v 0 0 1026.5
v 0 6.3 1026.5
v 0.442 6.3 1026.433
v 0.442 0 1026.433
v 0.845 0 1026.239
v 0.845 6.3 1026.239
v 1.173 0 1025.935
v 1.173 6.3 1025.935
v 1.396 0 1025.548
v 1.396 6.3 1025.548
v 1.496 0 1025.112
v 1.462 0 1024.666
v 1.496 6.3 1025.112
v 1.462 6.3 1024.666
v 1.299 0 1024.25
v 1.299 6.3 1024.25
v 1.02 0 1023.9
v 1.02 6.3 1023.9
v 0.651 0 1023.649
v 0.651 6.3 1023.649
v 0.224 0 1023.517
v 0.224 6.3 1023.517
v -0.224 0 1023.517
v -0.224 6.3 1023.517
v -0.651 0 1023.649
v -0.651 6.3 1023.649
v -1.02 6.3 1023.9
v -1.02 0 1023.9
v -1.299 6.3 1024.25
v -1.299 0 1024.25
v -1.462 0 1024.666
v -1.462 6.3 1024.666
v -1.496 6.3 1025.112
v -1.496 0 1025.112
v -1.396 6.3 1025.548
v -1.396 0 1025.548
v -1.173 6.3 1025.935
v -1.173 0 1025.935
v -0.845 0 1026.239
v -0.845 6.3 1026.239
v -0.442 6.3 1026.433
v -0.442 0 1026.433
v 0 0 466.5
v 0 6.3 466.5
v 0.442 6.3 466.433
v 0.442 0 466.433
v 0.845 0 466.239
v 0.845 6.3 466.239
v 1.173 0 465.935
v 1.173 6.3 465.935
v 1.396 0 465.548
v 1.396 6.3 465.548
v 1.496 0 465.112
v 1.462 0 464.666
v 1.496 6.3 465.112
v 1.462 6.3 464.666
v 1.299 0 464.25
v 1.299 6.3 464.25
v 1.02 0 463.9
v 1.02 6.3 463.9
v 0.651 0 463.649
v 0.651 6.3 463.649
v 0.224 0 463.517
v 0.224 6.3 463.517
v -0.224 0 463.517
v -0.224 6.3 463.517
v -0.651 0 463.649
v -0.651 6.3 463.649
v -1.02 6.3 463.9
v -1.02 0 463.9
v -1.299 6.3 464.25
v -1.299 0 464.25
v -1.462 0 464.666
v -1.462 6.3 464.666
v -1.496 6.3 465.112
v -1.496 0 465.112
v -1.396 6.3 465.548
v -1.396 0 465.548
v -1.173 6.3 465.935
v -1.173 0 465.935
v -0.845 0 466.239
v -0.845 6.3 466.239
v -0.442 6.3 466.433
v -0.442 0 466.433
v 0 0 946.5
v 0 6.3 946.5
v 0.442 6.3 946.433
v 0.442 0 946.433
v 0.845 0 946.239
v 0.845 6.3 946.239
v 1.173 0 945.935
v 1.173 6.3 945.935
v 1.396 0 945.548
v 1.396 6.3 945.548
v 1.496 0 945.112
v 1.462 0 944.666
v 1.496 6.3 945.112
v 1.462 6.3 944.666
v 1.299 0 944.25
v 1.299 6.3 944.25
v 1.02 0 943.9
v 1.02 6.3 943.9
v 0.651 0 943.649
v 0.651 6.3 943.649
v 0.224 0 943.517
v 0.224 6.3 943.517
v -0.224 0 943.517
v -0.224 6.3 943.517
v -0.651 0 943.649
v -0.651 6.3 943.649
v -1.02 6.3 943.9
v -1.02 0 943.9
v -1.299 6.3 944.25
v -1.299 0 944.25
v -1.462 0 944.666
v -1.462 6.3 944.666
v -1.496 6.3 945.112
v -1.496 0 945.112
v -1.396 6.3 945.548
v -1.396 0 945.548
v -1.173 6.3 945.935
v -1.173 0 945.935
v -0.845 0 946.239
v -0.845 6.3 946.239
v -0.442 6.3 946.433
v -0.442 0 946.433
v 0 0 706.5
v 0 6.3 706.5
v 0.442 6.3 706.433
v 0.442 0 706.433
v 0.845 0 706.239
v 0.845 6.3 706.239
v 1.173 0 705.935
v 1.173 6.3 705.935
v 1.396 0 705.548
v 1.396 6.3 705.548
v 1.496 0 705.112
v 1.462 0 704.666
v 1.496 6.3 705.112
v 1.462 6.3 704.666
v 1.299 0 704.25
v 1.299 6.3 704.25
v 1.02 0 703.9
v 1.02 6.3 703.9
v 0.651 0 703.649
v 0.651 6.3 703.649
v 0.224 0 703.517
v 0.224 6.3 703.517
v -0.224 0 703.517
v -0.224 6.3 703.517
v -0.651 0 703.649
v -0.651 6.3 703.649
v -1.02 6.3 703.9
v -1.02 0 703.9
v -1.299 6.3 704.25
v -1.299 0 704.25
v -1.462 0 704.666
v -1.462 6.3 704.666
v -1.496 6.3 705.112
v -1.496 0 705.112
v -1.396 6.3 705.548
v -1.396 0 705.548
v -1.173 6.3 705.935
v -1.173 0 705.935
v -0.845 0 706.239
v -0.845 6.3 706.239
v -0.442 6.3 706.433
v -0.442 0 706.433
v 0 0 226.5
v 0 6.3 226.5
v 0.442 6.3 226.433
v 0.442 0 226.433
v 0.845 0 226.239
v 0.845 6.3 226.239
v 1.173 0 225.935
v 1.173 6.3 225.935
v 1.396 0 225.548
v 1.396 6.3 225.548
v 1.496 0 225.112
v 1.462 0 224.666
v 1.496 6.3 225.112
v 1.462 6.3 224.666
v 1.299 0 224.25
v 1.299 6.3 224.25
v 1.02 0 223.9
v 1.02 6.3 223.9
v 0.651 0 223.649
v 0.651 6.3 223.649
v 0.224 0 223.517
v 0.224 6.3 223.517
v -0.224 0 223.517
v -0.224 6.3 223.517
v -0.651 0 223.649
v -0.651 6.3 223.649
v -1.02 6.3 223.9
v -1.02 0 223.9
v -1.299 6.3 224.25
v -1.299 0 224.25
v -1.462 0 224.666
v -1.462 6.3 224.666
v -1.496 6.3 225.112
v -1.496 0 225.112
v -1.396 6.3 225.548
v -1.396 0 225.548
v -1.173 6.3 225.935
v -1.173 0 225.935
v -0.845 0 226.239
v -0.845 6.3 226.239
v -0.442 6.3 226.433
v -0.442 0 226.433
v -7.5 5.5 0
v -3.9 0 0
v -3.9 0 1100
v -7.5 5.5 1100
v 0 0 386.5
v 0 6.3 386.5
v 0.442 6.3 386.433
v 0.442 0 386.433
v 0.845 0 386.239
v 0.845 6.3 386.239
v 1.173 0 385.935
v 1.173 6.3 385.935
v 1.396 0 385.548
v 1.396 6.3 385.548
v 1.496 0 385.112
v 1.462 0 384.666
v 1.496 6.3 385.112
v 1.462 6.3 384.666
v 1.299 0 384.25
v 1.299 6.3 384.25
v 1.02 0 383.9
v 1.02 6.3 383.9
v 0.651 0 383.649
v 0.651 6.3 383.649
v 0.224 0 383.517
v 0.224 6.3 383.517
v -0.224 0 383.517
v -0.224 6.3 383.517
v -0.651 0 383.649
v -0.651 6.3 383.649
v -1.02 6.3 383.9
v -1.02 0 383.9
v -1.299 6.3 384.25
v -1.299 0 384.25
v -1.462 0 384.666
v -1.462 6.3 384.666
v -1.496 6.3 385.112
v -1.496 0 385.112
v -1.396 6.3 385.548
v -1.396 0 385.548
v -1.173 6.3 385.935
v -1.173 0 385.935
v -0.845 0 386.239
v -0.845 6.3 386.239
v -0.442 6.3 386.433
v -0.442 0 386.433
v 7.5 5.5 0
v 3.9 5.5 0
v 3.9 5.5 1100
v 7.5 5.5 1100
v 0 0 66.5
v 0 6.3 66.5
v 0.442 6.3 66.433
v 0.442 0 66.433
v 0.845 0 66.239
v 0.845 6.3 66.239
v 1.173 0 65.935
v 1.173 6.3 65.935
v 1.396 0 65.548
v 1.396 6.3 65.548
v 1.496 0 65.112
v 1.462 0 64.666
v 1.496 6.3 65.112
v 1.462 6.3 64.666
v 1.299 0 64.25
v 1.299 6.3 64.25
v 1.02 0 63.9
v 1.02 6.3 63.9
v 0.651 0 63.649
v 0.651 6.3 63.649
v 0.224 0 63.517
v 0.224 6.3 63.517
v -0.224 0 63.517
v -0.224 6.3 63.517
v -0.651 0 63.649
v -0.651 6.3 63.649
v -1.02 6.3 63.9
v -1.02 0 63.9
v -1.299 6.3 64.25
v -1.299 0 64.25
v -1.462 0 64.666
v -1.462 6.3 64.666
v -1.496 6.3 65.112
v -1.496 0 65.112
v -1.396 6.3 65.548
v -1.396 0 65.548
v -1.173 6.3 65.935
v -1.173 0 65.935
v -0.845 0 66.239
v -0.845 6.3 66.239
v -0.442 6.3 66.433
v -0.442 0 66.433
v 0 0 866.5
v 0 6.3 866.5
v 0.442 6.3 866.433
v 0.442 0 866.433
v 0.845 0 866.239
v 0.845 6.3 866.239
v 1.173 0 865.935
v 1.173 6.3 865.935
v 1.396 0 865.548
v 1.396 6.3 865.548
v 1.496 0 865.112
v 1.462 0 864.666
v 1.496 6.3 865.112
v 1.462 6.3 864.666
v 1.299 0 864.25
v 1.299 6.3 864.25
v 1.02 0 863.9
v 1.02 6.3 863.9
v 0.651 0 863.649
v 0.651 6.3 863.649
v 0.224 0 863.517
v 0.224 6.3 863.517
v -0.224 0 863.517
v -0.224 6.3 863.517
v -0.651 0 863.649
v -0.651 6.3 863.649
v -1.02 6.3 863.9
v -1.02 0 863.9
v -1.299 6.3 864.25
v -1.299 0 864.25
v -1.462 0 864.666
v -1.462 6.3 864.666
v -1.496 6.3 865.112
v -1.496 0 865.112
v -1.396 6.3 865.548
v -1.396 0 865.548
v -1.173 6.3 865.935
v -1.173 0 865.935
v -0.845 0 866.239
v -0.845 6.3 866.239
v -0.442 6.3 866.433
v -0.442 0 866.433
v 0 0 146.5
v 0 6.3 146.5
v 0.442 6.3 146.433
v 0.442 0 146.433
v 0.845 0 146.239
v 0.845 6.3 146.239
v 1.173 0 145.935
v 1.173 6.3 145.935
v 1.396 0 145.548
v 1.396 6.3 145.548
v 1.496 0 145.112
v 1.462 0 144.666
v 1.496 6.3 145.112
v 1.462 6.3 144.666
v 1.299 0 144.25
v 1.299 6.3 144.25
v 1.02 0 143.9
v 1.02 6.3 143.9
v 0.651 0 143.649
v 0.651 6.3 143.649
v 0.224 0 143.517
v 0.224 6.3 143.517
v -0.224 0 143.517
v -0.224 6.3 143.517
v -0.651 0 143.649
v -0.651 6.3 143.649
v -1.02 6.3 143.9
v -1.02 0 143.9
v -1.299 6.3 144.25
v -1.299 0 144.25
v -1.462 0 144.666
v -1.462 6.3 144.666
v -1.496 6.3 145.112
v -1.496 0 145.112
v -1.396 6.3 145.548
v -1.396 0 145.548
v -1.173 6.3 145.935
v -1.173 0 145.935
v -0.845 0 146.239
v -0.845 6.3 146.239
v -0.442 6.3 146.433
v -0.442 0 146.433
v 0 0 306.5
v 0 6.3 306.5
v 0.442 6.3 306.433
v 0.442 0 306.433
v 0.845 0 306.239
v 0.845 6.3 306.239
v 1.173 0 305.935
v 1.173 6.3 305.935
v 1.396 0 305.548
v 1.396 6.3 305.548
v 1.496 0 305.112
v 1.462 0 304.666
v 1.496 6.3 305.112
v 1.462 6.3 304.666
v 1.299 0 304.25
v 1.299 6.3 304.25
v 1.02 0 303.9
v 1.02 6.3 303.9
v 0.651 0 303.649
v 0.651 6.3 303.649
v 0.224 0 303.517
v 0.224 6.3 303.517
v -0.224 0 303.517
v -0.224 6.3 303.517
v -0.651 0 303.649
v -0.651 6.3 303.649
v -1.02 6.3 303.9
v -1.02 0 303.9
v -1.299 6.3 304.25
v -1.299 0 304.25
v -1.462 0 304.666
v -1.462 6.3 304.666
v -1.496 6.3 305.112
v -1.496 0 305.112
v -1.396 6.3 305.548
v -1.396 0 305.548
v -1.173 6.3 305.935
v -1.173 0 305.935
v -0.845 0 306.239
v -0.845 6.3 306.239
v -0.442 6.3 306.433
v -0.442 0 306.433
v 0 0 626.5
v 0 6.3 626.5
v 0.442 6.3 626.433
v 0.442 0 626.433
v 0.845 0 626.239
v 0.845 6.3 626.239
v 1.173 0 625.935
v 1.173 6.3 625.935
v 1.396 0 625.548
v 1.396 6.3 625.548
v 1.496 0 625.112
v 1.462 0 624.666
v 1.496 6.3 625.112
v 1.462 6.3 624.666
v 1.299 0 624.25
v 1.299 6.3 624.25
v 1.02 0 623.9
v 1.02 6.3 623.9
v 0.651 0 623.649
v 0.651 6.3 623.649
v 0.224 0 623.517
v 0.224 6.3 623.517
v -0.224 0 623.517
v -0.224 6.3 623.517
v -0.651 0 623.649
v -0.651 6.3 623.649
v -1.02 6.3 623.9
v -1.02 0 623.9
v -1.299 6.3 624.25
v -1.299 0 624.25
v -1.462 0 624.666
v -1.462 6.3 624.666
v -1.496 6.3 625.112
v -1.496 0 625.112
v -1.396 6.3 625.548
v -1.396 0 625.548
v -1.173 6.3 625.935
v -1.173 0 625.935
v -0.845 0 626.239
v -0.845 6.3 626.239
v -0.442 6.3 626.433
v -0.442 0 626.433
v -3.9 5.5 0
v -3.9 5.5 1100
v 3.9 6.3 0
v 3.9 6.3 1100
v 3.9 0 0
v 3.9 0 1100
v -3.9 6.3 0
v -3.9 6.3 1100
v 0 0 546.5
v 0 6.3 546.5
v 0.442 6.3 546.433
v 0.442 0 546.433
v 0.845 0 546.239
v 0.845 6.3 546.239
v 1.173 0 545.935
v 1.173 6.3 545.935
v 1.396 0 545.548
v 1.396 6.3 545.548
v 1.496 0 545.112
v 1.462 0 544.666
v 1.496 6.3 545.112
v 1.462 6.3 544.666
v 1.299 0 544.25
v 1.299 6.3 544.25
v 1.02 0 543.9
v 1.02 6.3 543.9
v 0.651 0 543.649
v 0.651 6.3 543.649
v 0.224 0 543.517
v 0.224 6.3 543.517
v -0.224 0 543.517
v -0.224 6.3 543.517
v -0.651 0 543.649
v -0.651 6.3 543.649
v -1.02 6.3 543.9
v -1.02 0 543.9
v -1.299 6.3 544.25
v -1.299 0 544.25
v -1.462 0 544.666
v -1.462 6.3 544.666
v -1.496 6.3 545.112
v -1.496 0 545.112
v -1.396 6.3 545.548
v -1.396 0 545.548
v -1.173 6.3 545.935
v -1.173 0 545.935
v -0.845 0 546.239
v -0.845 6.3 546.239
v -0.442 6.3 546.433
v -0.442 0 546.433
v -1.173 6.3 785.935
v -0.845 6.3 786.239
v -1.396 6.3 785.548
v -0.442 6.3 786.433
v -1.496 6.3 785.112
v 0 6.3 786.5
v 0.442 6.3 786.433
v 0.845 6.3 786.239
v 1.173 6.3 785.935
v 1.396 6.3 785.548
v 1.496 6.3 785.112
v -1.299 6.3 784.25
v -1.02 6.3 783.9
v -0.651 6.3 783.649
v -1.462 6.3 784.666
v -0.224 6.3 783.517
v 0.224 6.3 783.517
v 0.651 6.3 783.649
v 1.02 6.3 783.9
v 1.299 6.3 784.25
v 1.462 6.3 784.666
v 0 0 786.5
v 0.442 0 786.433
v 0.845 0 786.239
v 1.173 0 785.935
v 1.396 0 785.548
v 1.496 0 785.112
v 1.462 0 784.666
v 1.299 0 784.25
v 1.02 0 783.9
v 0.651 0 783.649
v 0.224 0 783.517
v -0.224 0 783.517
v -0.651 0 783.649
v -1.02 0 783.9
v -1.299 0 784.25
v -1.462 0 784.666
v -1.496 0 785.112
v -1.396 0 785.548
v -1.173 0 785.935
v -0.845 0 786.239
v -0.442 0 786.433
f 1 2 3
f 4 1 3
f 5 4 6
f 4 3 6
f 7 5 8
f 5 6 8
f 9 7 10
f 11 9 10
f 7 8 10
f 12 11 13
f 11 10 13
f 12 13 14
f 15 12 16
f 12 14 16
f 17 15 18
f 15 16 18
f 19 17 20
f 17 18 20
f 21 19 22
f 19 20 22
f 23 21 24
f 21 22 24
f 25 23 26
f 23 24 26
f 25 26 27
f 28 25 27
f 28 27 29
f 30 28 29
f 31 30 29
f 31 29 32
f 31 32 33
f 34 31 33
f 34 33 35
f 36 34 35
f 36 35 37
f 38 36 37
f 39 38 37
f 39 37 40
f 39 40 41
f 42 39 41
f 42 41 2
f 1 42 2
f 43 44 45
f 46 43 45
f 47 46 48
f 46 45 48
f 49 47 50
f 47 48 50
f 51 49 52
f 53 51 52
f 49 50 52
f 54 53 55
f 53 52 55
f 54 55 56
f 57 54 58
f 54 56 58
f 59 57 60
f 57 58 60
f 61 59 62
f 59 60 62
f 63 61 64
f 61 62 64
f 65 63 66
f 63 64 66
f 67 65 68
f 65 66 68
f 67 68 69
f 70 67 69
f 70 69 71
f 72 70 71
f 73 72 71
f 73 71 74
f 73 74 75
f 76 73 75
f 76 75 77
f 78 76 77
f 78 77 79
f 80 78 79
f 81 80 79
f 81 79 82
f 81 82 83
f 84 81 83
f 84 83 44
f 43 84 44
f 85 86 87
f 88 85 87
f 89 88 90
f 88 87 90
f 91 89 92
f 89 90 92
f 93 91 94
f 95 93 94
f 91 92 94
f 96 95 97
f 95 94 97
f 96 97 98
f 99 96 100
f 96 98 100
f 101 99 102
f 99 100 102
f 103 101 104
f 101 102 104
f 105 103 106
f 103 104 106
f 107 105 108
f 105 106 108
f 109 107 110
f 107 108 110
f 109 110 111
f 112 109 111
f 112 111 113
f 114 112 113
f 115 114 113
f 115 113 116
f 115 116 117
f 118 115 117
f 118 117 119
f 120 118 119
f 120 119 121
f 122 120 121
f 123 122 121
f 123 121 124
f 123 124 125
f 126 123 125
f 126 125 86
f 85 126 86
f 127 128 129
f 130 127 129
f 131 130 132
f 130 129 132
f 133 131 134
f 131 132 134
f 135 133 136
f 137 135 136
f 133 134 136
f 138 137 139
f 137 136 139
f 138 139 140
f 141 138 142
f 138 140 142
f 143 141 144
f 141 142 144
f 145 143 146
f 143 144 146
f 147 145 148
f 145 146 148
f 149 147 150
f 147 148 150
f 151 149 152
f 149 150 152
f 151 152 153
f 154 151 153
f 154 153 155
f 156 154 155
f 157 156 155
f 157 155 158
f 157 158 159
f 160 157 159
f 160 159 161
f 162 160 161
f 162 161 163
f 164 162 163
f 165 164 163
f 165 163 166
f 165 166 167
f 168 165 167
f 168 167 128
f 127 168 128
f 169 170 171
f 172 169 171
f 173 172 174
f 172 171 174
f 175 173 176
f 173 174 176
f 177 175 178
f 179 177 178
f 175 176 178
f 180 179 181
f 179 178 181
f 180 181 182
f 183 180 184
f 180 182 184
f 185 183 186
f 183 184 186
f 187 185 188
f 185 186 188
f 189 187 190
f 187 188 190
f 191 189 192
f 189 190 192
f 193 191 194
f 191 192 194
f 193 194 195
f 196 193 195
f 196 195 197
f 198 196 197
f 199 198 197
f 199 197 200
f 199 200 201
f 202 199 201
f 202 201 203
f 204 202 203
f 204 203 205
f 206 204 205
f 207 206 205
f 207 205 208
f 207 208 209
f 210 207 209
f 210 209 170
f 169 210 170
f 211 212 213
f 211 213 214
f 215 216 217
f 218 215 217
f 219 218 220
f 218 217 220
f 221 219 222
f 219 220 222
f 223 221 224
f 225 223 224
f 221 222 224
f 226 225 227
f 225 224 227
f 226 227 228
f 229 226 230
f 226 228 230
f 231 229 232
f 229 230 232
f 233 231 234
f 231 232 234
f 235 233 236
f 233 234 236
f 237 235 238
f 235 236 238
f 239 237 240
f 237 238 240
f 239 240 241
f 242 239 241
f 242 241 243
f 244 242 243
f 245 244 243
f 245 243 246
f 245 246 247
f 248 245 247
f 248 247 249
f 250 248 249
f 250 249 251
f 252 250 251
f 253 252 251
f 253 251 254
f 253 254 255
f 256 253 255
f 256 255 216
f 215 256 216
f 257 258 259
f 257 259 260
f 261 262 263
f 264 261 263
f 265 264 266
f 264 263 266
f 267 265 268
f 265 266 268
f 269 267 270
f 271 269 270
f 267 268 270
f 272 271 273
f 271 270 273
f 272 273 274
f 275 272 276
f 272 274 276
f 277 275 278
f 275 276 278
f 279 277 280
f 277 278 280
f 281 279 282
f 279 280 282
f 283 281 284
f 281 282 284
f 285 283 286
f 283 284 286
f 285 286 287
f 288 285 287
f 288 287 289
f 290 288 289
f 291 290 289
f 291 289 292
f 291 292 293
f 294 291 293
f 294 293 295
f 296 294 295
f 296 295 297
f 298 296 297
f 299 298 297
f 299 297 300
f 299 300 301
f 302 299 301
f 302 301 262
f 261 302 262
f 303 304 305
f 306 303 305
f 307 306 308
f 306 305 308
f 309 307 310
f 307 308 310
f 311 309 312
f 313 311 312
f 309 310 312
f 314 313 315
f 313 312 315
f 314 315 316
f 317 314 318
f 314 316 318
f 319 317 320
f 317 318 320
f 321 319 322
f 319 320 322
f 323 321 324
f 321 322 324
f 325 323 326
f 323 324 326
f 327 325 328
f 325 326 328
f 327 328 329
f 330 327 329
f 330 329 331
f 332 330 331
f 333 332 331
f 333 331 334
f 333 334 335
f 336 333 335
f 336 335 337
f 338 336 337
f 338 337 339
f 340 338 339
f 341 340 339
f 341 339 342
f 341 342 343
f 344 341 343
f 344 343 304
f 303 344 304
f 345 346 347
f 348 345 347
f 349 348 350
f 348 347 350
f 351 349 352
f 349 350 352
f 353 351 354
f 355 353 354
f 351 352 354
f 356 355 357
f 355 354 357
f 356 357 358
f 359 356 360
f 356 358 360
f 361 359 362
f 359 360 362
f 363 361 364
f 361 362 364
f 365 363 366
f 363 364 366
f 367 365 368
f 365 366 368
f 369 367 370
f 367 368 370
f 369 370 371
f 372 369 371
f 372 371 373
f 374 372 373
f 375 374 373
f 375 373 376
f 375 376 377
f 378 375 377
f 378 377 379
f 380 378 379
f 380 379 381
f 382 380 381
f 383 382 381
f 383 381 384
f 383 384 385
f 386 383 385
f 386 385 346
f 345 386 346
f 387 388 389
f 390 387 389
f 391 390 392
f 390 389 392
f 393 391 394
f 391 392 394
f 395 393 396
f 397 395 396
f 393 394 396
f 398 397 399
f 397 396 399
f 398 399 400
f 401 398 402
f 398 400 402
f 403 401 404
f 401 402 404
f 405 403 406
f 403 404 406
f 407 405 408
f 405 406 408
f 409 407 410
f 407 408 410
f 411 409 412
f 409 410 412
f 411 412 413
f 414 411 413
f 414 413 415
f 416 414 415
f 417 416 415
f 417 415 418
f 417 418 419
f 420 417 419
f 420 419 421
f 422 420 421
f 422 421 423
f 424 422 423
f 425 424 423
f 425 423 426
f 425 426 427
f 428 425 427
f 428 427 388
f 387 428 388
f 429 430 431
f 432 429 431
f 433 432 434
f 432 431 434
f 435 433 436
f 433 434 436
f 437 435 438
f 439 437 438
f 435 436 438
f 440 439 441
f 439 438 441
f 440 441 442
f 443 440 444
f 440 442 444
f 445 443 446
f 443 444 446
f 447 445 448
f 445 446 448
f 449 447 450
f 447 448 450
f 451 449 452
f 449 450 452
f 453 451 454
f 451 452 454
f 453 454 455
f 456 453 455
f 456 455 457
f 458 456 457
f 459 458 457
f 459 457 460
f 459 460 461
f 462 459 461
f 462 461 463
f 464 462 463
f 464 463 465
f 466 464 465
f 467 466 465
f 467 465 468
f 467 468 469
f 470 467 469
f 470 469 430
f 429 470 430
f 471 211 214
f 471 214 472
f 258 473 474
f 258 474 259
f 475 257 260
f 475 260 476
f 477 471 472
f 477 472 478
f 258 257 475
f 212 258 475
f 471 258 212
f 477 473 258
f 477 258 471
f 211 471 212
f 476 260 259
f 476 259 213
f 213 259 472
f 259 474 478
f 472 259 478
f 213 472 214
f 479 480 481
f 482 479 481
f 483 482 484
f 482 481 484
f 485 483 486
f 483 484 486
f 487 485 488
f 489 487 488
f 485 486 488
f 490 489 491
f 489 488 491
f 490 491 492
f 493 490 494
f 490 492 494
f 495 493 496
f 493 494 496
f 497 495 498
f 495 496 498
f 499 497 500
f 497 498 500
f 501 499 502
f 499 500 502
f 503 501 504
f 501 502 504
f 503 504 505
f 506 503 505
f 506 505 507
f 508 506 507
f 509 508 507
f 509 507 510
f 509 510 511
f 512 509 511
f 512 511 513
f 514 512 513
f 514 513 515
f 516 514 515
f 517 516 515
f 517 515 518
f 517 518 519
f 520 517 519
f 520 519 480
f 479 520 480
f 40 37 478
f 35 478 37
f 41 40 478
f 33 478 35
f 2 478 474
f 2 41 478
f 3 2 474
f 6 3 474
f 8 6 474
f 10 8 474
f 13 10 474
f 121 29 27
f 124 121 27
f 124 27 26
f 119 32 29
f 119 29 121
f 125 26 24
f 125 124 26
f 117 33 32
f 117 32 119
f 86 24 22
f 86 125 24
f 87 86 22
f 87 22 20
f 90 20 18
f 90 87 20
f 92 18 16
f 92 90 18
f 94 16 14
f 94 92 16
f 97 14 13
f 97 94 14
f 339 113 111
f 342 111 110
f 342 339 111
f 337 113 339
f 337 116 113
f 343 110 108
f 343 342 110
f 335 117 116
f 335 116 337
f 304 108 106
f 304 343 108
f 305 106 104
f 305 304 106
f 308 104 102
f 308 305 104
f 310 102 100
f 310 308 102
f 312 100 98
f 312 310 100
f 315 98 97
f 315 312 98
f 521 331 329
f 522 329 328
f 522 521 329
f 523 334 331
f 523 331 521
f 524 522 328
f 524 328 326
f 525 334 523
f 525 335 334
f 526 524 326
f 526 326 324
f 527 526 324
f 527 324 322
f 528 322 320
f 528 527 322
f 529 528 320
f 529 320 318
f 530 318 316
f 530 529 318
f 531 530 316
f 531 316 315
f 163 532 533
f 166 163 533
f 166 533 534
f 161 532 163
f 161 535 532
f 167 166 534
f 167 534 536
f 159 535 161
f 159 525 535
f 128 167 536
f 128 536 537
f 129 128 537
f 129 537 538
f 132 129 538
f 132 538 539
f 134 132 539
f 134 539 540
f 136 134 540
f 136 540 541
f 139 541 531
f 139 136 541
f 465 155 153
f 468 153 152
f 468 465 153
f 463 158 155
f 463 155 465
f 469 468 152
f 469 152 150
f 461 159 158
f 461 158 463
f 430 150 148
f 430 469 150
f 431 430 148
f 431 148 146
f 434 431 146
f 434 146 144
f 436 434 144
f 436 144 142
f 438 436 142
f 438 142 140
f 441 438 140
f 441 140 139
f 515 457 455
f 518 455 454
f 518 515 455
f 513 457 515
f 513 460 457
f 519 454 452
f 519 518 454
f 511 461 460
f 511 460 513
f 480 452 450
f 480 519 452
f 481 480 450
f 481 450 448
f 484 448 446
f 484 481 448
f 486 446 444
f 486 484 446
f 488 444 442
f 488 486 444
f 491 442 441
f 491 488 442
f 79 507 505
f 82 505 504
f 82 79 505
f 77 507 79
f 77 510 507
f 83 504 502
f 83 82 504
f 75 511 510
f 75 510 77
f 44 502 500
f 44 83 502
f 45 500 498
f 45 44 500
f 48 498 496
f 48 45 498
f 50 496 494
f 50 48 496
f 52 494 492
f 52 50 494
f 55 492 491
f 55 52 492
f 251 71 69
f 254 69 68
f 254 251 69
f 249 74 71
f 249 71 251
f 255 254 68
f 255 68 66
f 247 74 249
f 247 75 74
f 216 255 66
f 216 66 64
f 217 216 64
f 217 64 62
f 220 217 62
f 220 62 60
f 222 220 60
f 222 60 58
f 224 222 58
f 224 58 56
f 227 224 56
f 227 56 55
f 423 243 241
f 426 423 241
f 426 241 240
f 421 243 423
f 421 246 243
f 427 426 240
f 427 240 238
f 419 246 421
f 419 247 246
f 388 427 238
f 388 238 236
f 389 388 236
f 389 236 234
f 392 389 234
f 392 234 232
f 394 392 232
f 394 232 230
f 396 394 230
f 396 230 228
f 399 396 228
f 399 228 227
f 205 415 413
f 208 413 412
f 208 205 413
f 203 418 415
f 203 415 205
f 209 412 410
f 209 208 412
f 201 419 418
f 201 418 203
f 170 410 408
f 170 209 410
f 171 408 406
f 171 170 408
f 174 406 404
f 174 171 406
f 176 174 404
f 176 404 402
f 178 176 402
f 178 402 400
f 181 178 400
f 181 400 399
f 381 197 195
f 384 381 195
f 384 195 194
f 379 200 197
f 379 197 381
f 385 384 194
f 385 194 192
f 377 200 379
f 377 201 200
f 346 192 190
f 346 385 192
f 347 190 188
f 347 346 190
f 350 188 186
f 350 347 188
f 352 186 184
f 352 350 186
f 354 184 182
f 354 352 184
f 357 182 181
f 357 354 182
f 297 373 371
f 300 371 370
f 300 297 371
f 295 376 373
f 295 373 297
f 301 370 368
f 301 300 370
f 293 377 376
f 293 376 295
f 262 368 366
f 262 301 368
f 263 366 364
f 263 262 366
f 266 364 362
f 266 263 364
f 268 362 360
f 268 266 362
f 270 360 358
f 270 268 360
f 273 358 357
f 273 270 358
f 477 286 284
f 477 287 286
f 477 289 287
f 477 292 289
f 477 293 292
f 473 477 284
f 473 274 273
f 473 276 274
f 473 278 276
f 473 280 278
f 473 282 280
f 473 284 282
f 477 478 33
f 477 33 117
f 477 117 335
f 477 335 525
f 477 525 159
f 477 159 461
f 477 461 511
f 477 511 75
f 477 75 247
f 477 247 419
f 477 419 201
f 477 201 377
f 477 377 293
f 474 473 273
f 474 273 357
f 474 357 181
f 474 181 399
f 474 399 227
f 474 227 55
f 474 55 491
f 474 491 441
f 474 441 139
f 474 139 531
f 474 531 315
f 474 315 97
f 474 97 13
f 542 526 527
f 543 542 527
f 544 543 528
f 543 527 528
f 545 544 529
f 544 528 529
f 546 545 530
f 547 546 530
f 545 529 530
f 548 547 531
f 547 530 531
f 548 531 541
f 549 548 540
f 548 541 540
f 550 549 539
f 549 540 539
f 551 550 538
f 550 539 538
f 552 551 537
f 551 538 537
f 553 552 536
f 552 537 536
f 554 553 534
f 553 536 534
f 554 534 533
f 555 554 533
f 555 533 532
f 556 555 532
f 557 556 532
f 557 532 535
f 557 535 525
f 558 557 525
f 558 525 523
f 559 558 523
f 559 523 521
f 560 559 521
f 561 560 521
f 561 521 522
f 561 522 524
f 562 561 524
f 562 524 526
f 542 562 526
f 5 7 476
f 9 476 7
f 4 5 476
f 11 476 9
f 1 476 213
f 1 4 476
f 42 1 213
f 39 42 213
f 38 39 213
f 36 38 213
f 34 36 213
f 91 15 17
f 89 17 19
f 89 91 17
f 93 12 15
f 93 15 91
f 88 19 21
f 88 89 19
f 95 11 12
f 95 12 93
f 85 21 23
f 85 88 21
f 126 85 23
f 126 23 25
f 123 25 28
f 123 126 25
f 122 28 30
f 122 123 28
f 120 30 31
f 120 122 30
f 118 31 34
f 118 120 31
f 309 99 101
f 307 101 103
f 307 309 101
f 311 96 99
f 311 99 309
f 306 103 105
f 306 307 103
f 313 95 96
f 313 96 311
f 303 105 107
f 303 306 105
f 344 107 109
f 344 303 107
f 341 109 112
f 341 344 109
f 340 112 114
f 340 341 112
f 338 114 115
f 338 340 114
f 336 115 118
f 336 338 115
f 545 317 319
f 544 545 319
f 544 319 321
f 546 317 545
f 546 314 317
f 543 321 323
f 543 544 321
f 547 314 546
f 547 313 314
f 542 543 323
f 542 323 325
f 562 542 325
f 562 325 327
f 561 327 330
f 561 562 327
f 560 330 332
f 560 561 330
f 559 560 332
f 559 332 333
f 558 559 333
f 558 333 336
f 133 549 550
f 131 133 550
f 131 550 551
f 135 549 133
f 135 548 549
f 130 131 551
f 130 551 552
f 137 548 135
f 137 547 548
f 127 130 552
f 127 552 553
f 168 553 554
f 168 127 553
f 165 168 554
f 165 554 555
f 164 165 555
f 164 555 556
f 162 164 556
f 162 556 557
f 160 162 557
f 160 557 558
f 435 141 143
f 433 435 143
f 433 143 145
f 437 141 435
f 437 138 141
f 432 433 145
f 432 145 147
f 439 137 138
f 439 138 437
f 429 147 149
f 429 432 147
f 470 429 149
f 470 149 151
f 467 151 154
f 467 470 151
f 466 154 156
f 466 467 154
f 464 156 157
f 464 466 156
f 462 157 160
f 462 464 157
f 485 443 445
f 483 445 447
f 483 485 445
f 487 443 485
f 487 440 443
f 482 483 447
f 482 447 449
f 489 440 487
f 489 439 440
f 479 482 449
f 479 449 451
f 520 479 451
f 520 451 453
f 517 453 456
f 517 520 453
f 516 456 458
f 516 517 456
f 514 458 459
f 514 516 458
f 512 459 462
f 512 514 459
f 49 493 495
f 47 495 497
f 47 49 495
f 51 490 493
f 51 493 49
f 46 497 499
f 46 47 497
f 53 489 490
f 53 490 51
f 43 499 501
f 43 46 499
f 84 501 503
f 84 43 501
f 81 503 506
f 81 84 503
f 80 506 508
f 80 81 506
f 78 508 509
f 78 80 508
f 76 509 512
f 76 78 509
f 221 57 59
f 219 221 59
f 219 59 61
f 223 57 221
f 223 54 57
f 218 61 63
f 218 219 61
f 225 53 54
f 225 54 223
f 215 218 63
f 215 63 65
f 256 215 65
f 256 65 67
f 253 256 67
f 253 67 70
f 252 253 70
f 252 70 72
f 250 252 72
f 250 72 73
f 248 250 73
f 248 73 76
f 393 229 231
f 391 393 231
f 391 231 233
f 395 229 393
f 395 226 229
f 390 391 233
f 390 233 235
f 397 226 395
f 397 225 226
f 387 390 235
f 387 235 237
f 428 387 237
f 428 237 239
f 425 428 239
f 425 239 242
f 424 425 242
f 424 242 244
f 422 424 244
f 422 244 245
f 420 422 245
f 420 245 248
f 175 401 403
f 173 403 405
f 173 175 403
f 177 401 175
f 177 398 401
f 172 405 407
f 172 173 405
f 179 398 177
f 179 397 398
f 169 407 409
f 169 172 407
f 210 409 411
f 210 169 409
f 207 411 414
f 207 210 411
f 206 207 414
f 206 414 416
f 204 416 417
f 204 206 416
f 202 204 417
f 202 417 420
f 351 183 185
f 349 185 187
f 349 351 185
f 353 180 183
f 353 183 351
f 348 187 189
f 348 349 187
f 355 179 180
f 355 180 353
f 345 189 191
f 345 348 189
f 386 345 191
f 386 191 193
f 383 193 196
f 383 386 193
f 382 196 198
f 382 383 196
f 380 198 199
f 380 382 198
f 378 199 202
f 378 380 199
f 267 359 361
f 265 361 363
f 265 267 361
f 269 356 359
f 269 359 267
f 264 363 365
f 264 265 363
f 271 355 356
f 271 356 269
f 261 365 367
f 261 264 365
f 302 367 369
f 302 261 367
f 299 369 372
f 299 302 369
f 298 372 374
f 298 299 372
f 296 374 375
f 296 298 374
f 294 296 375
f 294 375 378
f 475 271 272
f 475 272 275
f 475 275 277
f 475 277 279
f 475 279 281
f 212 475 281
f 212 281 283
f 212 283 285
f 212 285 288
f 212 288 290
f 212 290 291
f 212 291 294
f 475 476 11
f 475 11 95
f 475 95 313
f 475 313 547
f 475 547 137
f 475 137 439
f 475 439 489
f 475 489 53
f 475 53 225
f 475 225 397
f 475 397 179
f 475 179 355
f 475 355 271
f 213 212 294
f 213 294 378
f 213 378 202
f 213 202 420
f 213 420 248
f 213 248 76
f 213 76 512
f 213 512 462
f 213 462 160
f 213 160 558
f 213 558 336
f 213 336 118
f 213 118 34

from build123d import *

# Parameters (mm, degrees)
BOSS_EXTRUDE1_DEPTH = 1100
SKETCH2_R           = 1.5
CUT_EXTRUDE1_DEPTH  = 1101.043608227


with BuildPart() as part:
    # Sketch1 → Boss-Extrude1 (new body)
    with BuildSketch(Plane.XY):
        Polygon((3.9, 0), (-3.9, 0), (-7.5, 5.5), (-3.9, 5.5), (-3.9, 6.3), (3.9, 6.3), (3.9, 5.5), (7.5, 5.5), align=None)
    extrude(amount=BOSS_EXTRUDE1_DEPTH)

    # Sketch2 → Cut-Extrude1 (cut, through all)
    with BuildSketch(Plane(origin=(0, 6.3, 0), x_dir=(1, 0, 0), z_dir=(0, 1, 0))):
        with Locations(Location((0, -65, 0), (0, 0, 270))):
            Circle(SKETCH2_R)
        with Locations(Location((0, -145, 0), (0, 0, 270))):
            Circle(SKETCH2_R)
        with Locations(Location((0, -225, 0), (0, 0, 270))):
            Circle(SKETCH2_R)
        with Locations(Location((0, -305, 0), (0, 0, 270))):
            Circle(SKETCH2_R)
        with Locations(Location((0, -385, 0), (0, 0, 270))):
            Circle(SKETCH2_R)
        with Locations(Location((0, -465, 0), (0, 0, 270))):
            Circle(SKETCH2_R)
        with Locations(Location((0, -545, 0), (0, 0, 270))):
            Circle(SKETCH2_R)
        with Locations(Location((0, -625, 0), (0, 0, 270))):
            Circle(SKETCH2_R)
        with Locations(Location((0, -705, 0), (0, 0, 270))):
            Circle(SKETCH2_R)
        with Locations(Location((0, -785, 0), (0, 0, 270))):
            Circle(SKETCH2_R)
        with Locations(Location((0, -865, 0), (0, 0, 270))):
            Circle(SKETCH2_R)
        with Locations(Location((0, -945, 0), (0, 0, 270))):
            Circle(SKETCH2_R)
        with Locations(Location((0, -1025, 0), (0, 0, 270))):
            Circle(SKETCH2_R)
    extrude(amount=-CUT_EXTRUDE1_DEPTH, mode=Mode.SUBTRACT)


solid = part.part
